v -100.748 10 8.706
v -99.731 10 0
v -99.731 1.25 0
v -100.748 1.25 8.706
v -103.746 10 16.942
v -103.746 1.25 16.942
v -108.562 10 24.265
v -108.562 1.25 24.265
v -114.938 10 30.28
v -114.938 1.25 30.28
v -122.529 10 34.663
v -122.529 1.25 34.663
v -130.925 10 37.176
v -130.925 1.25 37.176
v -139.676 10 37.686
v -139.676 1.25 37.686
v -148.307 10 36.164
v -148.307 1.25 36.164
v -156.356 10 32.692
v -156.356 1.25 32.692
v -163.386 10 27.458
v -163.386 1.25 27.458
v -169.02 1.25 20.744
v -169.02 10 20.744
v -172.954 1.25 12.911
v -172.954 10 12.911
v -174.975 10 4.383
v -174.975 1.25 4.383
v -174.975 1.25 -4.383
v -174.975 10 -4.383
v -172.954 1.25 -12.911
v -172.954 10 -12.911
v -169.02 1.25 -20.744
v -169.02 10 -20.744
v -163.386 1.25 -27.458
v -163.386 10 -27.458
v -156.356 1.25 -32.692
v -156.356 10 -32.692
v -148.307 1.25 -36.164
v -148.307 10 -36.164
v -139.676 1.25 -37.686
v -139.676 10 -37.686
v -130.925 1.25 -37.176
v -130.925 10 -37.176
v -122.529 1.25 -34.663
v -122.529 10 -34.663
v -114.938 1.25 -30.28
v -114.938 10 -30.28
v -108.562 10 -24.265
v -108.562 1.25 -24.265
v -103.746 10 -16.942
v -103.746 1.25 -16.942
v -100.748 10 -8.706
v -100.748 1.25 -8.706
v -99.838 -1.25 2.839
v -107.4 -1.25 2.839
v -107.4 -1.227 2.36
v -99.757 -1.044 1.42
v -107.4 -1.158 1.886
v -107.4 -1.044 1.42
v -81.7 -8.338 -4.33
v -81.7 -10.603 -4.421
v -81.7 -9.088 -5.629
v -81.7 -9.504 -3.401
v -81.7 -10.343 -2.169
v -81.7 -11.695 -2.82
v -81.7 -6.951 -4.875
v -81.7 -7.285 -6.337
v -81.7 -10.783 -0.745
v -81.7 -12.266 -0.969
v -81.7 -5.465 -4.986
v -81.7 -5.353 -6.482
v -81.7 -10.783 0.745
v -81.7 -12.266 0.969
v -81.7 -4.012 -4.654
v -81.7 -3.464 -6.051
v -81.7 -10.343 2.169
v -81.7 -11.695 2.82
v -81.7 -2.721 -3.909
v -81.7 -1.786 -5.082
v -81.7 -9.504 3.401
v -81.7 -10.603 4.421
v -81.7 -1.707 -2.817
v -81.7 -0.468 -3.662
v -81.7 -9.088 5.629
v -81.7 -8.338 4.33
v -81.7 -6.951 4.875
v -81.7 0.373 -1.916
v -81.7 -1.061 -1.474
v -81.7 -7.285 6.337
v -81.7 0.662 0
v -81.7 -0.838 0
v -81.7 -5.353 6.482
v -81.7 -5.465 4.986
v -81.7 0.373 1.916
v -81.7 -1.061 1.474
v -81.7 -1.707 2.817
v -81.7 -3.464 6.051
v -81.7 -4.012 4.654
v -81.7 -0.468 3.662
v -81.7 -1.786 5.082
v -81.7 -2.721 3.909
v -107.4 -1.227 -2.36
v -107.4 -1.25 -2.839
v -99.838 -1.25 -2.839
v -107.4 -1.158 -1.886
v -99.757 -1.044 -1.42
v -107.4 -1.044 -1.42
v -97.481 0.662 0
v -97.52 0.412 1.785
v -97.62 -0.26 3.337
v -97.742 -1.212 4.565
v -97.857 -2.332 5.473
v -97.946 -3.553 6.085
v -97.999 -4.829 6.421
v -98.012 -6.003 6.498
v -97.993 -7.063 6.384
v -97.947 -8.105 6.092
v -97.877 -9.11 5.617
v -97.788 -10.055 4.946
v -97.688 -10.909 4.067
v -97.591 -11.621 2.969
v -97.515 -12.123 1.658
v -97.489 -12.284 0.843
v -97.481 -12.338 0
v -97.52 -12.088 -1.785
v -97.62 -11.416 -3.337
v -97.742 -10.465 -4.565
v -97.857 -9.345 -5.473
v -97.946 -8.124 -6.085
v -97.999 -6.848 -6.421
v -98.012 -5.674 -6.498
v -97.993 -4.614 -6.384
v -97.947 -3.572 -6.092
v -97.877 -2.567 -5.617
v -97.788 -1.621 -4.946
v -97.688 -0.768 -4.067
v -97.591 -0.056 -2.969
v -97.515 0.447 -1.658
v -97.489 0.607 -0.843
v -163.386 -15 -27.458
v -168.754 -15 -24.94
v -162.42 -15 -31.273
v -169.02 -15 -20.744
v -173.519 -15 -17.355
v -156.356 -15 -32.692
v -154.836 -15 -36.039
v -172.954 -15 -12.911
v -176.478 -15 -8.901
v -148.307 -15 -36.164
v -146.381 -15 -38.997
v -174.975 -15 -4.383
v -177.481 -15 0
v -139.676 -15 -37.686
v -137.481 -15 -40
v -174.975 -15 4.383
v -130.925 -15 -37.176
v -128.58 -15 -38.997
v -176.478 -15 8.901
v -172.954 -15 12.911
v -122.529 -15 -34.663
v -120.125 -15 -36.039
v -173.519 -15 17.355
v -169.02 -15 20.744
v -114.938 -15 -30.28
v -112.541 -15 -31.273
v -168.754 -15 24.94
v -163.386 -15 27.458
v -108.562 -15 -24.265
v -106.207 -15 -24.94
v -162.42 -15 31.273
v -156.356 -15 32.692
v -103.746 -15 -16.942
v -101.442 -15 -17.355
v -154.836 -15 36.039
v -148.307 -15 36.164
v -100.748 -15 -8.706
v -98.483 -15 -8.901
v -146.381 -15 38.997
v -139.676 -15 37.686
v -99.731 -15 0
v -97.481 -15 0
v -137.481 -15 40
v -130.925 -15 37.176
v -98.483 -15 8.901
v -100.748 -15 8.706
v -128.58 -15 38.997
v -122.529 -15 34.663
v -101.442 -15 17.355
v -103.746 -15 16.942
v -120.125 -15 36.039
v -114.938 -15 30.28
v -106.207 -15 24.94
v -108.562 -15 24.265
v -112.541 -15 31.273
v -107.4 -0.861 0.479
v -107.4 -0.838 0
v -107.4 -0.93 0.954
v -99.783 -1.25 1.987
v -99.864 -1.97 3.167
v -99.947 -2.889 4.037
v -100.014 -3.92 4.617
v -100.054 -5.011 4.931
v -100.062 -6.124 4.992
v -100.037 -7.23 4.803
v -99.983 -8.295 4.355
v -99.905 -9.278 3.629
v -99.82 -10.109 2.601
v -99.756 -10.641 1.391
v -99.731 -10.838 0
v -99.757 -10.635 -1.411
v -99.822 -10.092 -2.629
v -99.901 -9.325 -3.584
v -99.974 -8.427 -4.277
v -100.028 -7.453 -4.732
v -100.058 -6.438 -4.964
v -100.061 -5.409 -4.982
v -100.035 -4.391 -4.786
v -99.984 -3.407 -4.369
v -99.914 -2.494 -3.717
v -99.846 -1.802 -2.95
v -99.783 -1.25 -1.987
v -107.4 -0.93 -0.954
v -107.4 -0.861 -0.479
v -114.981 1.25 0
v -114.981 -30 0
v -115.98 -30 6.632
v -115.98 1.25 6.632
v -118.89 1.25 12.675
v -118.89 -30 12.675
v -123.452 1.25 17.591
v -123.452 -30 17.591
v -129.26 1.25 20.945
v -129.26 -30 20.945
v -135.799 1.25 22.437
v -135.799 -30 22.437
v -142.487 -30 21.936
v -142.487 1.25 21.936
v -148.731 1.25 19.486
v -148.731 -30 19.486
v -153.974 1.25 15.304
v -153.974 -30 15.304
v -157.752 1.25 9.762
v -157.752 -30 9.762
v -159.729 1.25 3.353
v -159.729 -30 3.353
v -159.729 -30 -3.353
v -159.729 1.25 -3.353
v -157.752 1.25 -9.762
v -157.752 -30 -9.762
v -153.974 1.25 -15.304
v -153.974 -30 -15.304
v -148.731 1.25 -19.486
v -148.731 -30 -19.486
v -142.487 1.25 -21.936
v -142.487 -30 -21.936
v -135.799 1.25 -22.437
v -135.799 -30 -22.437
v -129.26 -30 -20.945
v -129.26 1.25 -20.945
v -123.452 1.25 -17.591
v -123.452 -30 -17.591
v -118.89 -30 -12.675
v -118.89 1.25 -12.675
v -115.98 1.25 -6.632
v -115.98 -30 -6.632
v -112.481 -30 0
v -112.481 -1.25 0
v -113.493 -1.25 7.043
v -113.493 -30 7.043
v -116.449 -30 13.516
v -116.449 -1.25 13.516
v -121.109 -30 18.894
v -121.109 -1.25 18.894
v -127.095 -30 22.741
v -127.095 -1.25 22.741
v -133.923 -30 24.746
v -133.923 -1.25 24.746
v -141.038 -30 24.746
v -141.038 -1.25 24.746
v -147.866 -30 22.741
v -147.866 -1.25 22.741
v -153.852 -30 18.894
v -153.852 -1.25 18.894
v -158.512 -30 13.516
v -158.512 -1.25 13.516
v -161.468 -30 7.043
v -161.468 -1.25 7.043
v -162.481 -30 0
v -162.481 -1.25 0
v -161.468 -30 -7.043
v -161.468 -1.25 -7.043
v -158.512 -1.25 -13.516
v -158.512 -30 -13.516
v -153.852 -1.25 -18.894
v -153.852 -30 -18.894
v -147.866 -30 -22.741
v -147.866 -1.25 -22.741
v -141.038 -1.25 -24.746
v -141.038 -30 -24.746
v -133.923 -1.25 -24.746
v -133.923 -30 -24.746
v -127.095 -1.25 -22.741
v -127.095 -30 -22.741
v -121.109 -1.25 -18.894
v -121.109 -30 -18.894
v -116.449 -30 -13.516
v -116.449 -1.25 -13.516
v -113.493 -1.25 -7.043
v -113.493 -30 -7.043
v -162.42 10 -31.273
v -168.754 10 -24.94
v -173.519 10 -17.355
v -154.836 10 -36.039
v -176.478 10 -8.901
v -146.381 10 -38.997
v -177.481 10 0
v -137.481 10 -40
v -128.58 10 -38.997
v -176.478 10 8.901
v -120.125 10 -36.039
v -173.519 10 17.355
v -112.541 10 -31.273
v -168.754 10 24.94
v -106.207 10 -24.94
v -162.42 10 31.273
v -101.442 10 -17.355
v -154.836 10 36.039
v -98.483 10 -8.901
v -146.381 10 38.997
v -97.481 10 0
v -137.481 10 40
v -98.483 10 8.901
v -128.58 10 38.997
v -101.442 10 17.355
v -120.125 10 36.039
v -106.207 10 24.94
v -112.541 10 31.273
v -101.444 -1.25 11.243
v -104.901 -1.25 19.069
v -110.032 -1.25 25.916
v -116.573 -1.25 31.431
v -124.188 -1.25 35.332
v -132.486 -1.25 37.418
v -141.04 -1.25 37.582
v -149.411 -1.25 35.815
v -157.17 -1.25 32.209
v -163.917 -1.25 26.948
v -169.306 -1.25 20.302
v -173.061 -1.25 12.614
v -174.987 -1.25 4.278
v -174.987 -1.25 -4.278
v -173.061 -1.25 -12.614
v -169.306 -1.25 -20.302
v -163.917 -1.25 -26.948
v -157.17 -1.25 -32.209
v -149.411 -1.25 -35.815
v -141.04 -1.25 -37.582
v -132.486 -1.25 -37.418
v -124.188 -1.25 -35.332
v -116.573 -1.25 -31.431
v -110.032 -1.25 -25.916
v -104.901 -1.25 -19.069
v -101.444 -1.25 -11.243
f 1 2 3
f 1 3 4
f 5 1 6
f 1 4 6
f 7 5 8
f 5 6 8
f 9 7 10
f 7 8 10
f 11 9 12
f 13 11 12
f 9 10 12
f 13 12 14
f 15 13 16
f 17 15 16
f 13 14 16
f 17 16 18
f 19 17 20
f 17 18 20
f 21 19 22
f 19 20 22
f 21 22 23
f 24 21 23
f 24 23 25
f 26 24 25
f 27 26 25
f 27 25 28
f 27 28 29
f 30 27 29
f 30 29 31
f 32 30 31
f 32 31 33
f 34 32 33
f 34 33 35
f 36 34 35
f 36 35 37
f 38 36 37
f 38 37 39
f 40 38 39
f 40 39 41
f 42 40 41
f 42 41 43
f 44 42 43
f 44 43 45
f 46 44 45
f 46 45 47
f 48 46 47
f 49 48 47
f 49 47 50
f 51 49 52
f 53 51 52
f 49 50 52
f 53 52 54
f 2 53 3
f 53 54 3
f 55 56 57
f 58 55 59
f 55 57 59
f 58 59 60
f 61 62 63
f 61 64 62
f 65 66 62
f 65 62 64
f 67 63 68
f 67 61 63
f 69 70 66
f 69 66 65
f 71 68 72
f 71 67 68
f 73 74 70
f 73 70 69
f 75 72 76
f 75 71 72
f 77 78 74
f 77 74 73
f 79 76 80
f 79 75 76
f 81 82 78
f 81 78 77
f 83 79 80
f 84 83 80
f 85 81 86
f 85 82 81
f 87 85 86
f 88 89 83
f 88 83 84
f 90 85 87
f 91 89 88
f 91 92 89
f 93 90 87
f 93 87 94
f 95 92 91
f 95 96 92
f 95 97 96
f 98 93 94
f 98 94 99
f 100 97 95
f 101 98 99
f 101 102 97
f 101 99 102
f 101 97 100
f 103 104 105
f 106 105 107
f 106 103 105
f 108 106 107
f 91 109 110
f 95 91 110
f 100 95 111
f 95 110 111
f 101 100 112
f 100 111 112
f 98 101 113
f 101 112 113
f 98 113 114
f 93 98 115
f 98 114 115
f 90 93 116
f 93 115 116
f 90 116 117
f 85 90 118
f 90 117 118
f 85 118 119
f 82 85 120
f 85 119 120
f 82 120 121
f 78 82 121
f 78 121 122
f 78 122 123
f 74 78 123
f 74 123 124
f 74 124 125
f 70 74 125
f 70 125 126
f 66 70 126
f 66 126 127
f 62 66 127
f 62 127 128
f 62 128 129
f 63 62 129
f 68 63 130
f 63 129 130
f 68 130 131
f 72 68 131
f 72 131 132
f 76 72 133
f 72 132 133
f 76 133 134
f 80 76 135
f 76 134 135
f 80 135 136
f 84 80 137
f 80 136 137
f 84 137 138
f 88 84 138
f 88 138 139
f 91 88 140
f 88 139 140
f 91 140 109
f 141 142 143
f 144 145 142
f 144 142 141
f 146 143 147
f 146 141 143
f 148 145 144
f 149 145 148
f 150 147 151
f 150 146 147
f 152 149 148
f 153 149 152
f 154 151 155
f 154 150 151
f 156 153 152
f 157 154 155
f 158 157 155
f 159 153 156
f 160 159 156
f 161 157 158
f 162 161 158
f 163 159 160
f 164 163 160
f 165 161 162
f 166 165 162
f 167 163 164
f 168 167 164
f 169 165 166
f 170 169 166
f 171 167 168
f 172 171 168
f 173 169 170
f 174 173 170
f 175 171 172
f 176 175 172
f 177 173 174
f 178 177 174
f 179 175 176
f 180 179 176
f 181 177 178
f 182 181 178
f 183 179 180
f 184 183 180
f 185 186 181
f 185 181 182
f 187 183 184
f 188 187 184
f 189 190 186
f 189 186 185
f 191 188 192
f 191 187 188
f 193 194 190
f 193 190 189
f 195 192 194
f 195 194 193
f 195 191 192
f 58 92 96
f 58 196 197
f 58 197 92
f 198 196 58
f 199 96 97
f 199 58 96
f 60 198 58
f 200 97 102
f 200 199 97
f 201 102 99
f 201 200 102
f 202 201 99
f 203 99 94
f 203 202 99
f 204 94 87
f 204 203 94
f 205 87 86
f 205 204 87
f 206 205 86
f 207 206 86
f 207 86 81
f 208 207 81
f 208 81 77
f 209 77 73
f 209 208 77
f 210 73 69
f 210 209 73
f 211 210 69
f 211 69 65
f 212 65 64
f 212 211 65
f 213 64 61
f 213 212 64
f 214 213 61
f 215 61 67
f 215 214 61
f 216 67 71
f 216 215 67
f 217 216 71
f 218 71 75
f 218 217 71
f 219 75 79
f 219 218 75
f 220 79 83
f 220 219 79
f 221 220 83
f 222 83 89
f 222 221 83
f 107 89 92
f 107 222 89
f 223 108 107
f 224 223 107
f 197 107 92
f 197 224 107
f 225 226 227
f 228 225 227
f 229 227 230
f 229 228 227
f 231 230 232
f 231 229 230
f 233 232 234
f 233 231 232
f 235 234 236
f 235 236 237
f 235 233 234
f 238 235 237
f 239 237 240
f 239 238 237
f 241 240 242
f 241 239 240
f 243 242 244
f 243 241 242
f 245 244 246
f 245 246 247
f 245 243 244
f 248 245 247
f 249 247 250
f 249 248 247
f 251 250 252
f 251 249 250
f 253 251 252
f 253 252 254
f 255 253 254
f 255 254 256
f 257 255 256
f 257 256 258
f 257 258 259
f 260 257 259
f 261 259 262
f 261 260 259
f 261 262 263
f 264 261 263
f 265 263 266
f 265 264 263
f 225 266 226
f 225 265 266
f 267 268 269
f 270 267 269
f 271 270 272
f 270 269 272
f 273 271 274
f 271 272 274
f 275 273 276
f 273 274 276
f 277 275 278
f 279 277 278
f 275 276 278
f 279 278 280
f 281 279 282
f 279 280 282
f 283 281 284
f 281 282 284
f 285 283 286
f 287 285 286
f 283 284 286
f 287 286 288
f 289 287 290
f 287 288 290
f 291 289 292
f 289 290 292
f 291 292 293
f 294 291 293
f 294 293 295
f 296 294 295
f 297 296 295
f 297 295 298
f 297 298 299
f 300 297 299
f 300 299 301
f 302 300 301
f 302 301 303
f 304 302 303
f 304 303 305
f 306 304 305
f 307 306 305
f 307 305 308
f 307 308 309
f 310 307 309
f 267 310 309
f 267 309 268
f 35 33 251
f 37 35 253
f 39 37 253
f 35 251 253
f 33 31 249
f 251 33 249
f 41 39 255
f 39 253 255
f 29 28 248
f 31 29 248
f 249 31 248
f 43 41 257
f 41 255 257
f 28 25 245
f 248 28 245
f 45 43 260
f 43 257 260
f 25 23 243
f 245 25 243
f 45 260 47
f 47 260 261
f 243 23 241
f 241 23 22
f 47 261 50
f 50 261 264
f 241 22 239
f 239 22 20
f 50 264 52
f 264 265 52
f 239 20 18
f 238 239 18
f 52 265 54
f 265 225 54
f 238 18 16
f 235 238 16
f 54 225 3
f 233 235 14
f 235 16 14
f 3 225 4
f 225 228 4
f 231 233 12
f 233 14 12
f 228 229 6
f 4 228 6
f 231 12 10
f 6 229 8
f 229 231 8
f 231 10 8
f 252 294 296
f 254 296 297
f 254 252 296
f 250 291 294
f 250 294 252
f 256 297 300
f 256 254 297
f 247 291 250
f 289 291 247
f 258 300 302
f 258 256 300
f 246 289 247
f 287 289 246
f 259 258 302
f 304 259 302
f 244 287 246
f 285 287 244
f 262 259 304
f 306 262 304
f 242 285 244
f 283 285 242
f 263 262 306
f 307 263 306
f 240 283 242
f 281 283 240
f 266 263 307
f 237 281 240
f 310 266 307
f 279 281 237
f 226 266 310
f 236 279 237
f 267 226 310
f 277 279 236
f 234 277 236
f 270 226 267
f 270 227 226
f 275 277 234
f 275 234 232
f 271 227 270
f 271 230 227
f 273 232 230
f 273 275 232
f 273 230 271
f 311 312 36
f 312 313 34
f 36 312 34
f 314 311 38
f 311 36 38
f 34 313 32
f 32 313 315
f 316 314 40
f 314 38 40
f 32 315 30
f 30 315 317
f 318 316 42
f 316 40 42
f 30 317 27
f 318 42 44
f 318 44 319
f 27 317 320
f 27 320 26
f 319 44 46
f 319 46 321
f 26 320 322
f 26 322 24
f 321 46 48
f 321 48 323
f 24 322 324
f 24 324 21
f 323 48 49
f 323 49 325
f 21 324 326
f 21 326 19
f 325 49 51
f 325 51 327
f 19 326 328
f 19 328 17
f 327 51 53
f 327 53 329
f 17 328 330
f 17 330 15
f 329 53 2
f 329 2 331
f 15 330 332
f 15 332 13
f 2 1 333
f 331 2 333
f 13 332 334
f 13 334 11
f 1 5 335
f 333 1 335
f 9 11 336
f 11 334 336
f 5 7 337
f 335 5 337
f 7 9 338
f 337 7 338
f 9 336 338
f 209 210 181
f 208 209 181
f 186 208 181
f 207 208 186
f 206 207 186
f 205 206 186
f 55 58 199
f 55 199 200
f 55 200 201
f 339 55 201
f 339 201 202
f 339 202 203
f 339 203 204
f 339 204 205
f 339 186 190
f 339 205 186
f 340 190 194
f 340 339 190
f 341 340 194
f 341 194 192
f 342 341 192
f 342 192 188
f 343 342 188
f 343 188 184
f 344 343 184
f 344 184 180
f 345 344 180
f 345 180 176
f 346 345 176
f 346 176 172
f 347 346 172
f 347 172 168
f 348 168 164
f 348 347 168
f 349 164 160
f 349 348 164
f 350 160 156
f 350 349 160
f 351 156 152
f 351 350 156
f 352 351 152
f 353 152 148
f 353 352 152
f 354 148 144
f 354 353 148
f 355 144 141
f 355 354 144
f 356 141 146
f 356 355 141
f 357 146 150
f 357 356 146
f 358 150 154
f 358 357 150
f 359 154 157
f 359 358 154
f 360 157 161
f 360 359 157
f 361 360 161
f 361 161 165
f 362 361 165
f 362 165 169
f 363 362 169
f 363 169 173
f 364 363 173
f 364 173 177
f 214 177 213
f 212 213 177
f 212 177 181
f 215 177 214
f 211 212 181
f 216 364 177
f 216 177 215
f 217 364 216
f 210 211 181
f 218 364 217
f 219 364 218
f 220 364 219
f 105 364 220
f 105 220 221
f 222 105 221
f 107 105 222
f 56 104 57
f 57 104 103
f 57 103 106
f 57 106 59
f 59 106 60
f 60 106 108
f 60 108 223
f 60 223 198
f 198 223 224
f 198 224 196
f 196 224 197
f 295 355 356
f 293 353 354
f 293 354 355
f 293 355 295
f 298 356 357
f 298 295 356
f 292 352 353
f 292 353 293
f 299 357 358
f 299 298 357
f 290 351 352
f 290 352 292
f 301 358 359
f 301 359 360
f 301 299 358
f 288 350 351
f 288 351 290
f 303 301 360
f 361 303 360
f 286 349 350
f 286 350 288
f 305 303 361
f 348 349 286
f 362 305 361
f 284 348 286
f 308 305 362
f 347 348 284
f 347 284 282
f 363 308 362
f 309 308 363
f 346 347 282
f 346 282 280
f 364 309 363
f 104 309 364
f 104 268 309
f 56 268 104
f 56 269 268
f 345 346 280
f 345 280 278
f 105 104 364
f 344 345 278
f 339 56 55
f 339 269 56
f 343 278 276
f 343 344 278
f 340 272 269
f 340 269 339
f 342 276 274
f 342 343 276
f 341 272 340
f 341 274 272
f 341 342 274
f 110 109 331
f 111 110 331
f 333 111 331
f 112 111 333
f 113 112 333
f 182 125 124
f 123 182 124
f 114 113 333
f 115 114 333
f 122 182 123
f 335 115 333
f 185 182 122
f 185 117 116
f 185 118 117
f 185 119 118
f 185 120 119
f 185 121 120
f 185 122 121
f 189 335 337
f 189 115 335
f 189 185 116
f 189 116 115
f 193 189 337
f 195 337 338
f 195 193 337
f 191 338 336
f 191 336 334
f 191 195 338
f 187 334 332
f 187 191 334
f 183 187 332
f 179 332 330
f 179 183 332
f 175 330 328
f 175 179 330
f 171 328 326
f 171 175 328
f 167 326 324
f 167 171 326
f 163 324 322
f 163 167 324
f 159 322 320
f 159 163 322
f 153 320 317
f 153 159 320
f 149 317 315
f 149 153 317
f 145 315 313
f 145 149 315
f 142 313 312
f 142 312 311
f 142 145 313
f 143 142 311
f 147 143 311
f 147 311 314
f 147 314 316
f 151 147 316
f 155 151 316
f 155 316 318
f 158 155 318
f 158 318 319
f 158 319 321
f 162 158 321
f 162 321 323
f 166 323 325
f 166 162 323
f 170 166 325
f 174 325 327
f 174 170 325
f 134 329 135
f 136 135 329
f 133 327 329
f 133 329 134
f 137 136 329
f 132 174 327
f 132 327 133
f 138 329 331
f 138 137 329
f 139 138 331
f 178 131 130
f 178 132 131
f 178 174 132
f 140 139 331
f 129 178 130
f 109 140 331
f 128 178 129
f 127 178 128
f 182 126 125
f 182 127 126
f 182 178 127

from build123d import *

# Parameters (mm, degrees)
F0_R      = 40
F0_R_2    = 37.75
F1_DEPTH  = 15
F2_DEPTH  = 10
F0_R_3    = 25
F3_DEPTH  = 1.25
F0_R_4    = 22.5
F4_DEPTH  = 30
F5_DEPTH  = 1.25
F7_R      = 5
F8_DEPTH  = 39
F9_R      = 5
F11_R     = 6.5
F11_R_2   = 5
F12_DEPTH = 17
F13_DEPTH = 10


with BuildPart() as f1:
    # F0 (on Front) → F1 (new body)
    with BuildSketch(Plane.XZ):
        with Locations((-137.480571866, 0)):
            Circle(F0_R)
        with Locations((-137.480571866, 0)):
            Circle(F0_R_2, mode=Mode.SUBTRACT)
    extrude(amount=F1_DEPTH)

    # F2 (add): a face of the model
    f2_faces = [f1.faces().sort_by_distance(p)[0] for p in [
        (-176.3492010161, 0, 0),
    ]]
    extrude(f2_faces, amount=F2_DEPTH)

    # F0 (on Front) → F3 (join, symmetric)
    with BuildSketch(Plane.XZ):
        with Locations((-137.480571866, 0)):
            Circle(F0_R_2)
        with Locations((-137.480571866, 0)):
            Circle(F0_R_3, mode=Mode.SUBTRACT)
    extrude(amount=F3_DEPTH, both=True)

    # F0 (on Front) → F4 (join)
    with BuildSketch(Plane.XZ):
        with Locations((-137.480571866, 0)):
            Circle(F0_R_3)
        with Locations((-137.480571866, 0)):
            Circle(F0_R_4, mode=Mode.SUBTRACT)
    extrude(amount=F4_DEPTH)

    # F5 (add): a face of the model
    f5_faces = [f1.faces().sort_by_distance(p)[0] for p in [
        (-161.7734650848, 0, 0),
    ]]
    extrude(f5_faces, amount=F5_DEPTH)

    # F7 (on offset) → F8 (cut)
    with BuildSketch(Plane.YZ.offset(-107.4)):
        with Locations((-5.8384072036, 0)):
            Circle(F7_R)
    extrude(amount=F8_DEPTH, mode=Mode.SUBTRACT)

    # F9
    f9_edges = [f1.edges().sort_by_distance(p)[0] for p in [
        (-103.59144, -1.25, 1.986585),
        (-103.59144, -1.25, -1.986585),
    ]]
    fillet(f9_edges, radius=F9_R)

    # F11 (on offset) → F12 (join)
    with BuildSketch(Plane.YZ.offset(-98.7)):
        with Locations((-5.8384072036, 0)):
            Circle(F11_R)
        with Locations((-5.8384072036, 0)):
            Circle(F11_R_2, mode=Mode.SUBTRACT)
    extrude(amount=F12_DEPTH)

    # F11 (on offset) → F13 (join)
    with BuildSketch(Plane.YZ.offset(-98.7)):
        with Locations((-5.8384072036, 0)):
            Circle(F11_R)
        with Locations((-5.8384072036, 0)):
            Circle(F11_R_2, mode=Mode.SUBTRACT)
    extrude(amount=F13_DEPTH)


solid = f1.part
